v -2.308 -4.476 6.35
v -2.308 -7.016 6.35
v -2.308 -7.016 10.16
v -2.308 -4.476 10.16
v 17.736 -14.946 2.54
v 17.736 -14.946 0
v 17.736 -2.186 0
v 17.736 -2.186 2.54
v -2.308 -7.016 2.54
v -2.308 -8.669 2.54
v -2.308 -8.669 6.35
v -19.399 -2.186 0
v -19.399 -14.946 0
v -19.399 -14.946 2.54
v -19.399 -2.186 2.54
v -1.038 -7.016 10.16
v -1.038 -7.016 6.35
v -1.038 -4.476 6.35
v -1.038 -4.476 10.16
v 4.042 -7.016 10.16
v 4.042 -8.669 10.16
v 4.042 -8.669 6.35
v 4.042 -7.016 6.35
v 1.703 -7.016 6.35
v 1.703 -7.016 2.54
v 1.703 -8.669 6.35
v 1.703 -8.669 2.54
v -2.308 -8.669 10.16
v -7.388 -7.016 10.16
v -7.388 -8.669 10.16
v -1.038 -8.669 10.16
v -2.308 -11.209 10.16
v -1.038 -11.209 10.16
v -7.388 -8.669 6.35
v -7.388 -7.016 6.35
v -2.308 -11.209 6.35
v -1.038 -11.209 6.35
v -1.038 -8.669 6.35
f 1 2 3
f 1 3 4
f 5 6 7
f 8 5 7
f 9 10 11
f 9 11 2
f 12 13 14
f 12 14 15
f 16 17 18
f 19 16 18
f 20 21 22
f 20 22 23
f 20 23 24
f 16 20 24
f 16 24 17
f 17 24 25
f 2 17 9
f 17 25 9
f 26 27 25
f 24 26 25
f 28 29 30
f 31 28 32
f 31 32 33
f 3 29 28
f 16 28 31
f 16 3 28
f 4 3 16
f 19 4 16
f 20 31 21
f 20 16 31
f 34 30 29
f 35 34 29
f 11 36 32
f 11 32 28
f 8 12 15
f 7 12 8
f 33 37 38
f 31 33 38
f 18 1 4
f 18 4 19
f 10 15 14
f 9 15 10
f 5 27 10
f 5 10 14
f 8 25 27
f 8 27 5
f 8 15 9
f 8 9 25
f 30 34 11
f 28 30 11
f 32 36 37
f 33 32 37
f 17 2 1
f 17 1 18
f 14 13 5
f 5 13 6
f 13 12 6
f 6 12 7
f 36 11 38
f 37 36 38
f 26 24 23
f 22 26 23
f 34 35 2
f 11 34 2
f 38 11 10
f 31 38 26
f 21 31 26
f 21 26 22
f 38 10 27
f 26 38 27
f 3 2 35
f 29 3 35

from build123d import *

# Parameters (mm, degrees)
F0_W     = 37.1348839253
F0_H     = 12.7599176485
F1_DEPTH = 2.54
F2_W     = 4.0106745437
F2_H     = 1.6526868567
F3_DEPTH = 3.81
F4_W     = 5.08
F4_H     = 1.6526868567
F4_W_2   = 1.27
F4_W_3   = 2.7406745437
F4_W_4   = 2.3393254563
F4_H_2   = 2.54
F5_DEPTH = 3.81


with BuildPart() as f1:
    # F0 (on Top) → F1 (new body)
    with BuildSketch(Plane.XY):
        with Locations((-0.831102021, -8.5664497456)):
            Rectangle(F0_W, F0_H)
    extrude(amount=F1_DEPTH)

    # F2 (on face) → F3 (join)
    with BuildSketch(Plane.XY.offset(2.54)):
        with Locations((-0.302497996, -7.8425793909)):
            Rectangle(F2_W, F2_H)
    extrude(amount=F3_DEPTH)

    # F4 (on face) → F5 (join)
    with BuildSketch(Plane.XY.offset(6.35)):
        with Locations((-4.8478352679, -7.8425793909)):
            Rectangle(F4_W, F4_H)
        with Locations((-1.6728352679, -7.8425793909)):
            Rectangle(F4_W_2, F4_H)
        with Locations((0.332502004, -7.8425793909)):
            Rectangle(F4_W_3, F4_H)
        with Locations((2.872502004, -7.8425793909)):
            Rectangle(F4_W_4, F4_H)
        with Locations((-1.6728352679, -5.7462359625)):
            Rectangle(F4_W_2, F4_H_2)
        with Locations((-1.6728352679, -9.9389228192)):
            Rectangle(F4_W_2, F4_H_2)
    extrude(amount=F5_DEPTH)


solid = f1.part
